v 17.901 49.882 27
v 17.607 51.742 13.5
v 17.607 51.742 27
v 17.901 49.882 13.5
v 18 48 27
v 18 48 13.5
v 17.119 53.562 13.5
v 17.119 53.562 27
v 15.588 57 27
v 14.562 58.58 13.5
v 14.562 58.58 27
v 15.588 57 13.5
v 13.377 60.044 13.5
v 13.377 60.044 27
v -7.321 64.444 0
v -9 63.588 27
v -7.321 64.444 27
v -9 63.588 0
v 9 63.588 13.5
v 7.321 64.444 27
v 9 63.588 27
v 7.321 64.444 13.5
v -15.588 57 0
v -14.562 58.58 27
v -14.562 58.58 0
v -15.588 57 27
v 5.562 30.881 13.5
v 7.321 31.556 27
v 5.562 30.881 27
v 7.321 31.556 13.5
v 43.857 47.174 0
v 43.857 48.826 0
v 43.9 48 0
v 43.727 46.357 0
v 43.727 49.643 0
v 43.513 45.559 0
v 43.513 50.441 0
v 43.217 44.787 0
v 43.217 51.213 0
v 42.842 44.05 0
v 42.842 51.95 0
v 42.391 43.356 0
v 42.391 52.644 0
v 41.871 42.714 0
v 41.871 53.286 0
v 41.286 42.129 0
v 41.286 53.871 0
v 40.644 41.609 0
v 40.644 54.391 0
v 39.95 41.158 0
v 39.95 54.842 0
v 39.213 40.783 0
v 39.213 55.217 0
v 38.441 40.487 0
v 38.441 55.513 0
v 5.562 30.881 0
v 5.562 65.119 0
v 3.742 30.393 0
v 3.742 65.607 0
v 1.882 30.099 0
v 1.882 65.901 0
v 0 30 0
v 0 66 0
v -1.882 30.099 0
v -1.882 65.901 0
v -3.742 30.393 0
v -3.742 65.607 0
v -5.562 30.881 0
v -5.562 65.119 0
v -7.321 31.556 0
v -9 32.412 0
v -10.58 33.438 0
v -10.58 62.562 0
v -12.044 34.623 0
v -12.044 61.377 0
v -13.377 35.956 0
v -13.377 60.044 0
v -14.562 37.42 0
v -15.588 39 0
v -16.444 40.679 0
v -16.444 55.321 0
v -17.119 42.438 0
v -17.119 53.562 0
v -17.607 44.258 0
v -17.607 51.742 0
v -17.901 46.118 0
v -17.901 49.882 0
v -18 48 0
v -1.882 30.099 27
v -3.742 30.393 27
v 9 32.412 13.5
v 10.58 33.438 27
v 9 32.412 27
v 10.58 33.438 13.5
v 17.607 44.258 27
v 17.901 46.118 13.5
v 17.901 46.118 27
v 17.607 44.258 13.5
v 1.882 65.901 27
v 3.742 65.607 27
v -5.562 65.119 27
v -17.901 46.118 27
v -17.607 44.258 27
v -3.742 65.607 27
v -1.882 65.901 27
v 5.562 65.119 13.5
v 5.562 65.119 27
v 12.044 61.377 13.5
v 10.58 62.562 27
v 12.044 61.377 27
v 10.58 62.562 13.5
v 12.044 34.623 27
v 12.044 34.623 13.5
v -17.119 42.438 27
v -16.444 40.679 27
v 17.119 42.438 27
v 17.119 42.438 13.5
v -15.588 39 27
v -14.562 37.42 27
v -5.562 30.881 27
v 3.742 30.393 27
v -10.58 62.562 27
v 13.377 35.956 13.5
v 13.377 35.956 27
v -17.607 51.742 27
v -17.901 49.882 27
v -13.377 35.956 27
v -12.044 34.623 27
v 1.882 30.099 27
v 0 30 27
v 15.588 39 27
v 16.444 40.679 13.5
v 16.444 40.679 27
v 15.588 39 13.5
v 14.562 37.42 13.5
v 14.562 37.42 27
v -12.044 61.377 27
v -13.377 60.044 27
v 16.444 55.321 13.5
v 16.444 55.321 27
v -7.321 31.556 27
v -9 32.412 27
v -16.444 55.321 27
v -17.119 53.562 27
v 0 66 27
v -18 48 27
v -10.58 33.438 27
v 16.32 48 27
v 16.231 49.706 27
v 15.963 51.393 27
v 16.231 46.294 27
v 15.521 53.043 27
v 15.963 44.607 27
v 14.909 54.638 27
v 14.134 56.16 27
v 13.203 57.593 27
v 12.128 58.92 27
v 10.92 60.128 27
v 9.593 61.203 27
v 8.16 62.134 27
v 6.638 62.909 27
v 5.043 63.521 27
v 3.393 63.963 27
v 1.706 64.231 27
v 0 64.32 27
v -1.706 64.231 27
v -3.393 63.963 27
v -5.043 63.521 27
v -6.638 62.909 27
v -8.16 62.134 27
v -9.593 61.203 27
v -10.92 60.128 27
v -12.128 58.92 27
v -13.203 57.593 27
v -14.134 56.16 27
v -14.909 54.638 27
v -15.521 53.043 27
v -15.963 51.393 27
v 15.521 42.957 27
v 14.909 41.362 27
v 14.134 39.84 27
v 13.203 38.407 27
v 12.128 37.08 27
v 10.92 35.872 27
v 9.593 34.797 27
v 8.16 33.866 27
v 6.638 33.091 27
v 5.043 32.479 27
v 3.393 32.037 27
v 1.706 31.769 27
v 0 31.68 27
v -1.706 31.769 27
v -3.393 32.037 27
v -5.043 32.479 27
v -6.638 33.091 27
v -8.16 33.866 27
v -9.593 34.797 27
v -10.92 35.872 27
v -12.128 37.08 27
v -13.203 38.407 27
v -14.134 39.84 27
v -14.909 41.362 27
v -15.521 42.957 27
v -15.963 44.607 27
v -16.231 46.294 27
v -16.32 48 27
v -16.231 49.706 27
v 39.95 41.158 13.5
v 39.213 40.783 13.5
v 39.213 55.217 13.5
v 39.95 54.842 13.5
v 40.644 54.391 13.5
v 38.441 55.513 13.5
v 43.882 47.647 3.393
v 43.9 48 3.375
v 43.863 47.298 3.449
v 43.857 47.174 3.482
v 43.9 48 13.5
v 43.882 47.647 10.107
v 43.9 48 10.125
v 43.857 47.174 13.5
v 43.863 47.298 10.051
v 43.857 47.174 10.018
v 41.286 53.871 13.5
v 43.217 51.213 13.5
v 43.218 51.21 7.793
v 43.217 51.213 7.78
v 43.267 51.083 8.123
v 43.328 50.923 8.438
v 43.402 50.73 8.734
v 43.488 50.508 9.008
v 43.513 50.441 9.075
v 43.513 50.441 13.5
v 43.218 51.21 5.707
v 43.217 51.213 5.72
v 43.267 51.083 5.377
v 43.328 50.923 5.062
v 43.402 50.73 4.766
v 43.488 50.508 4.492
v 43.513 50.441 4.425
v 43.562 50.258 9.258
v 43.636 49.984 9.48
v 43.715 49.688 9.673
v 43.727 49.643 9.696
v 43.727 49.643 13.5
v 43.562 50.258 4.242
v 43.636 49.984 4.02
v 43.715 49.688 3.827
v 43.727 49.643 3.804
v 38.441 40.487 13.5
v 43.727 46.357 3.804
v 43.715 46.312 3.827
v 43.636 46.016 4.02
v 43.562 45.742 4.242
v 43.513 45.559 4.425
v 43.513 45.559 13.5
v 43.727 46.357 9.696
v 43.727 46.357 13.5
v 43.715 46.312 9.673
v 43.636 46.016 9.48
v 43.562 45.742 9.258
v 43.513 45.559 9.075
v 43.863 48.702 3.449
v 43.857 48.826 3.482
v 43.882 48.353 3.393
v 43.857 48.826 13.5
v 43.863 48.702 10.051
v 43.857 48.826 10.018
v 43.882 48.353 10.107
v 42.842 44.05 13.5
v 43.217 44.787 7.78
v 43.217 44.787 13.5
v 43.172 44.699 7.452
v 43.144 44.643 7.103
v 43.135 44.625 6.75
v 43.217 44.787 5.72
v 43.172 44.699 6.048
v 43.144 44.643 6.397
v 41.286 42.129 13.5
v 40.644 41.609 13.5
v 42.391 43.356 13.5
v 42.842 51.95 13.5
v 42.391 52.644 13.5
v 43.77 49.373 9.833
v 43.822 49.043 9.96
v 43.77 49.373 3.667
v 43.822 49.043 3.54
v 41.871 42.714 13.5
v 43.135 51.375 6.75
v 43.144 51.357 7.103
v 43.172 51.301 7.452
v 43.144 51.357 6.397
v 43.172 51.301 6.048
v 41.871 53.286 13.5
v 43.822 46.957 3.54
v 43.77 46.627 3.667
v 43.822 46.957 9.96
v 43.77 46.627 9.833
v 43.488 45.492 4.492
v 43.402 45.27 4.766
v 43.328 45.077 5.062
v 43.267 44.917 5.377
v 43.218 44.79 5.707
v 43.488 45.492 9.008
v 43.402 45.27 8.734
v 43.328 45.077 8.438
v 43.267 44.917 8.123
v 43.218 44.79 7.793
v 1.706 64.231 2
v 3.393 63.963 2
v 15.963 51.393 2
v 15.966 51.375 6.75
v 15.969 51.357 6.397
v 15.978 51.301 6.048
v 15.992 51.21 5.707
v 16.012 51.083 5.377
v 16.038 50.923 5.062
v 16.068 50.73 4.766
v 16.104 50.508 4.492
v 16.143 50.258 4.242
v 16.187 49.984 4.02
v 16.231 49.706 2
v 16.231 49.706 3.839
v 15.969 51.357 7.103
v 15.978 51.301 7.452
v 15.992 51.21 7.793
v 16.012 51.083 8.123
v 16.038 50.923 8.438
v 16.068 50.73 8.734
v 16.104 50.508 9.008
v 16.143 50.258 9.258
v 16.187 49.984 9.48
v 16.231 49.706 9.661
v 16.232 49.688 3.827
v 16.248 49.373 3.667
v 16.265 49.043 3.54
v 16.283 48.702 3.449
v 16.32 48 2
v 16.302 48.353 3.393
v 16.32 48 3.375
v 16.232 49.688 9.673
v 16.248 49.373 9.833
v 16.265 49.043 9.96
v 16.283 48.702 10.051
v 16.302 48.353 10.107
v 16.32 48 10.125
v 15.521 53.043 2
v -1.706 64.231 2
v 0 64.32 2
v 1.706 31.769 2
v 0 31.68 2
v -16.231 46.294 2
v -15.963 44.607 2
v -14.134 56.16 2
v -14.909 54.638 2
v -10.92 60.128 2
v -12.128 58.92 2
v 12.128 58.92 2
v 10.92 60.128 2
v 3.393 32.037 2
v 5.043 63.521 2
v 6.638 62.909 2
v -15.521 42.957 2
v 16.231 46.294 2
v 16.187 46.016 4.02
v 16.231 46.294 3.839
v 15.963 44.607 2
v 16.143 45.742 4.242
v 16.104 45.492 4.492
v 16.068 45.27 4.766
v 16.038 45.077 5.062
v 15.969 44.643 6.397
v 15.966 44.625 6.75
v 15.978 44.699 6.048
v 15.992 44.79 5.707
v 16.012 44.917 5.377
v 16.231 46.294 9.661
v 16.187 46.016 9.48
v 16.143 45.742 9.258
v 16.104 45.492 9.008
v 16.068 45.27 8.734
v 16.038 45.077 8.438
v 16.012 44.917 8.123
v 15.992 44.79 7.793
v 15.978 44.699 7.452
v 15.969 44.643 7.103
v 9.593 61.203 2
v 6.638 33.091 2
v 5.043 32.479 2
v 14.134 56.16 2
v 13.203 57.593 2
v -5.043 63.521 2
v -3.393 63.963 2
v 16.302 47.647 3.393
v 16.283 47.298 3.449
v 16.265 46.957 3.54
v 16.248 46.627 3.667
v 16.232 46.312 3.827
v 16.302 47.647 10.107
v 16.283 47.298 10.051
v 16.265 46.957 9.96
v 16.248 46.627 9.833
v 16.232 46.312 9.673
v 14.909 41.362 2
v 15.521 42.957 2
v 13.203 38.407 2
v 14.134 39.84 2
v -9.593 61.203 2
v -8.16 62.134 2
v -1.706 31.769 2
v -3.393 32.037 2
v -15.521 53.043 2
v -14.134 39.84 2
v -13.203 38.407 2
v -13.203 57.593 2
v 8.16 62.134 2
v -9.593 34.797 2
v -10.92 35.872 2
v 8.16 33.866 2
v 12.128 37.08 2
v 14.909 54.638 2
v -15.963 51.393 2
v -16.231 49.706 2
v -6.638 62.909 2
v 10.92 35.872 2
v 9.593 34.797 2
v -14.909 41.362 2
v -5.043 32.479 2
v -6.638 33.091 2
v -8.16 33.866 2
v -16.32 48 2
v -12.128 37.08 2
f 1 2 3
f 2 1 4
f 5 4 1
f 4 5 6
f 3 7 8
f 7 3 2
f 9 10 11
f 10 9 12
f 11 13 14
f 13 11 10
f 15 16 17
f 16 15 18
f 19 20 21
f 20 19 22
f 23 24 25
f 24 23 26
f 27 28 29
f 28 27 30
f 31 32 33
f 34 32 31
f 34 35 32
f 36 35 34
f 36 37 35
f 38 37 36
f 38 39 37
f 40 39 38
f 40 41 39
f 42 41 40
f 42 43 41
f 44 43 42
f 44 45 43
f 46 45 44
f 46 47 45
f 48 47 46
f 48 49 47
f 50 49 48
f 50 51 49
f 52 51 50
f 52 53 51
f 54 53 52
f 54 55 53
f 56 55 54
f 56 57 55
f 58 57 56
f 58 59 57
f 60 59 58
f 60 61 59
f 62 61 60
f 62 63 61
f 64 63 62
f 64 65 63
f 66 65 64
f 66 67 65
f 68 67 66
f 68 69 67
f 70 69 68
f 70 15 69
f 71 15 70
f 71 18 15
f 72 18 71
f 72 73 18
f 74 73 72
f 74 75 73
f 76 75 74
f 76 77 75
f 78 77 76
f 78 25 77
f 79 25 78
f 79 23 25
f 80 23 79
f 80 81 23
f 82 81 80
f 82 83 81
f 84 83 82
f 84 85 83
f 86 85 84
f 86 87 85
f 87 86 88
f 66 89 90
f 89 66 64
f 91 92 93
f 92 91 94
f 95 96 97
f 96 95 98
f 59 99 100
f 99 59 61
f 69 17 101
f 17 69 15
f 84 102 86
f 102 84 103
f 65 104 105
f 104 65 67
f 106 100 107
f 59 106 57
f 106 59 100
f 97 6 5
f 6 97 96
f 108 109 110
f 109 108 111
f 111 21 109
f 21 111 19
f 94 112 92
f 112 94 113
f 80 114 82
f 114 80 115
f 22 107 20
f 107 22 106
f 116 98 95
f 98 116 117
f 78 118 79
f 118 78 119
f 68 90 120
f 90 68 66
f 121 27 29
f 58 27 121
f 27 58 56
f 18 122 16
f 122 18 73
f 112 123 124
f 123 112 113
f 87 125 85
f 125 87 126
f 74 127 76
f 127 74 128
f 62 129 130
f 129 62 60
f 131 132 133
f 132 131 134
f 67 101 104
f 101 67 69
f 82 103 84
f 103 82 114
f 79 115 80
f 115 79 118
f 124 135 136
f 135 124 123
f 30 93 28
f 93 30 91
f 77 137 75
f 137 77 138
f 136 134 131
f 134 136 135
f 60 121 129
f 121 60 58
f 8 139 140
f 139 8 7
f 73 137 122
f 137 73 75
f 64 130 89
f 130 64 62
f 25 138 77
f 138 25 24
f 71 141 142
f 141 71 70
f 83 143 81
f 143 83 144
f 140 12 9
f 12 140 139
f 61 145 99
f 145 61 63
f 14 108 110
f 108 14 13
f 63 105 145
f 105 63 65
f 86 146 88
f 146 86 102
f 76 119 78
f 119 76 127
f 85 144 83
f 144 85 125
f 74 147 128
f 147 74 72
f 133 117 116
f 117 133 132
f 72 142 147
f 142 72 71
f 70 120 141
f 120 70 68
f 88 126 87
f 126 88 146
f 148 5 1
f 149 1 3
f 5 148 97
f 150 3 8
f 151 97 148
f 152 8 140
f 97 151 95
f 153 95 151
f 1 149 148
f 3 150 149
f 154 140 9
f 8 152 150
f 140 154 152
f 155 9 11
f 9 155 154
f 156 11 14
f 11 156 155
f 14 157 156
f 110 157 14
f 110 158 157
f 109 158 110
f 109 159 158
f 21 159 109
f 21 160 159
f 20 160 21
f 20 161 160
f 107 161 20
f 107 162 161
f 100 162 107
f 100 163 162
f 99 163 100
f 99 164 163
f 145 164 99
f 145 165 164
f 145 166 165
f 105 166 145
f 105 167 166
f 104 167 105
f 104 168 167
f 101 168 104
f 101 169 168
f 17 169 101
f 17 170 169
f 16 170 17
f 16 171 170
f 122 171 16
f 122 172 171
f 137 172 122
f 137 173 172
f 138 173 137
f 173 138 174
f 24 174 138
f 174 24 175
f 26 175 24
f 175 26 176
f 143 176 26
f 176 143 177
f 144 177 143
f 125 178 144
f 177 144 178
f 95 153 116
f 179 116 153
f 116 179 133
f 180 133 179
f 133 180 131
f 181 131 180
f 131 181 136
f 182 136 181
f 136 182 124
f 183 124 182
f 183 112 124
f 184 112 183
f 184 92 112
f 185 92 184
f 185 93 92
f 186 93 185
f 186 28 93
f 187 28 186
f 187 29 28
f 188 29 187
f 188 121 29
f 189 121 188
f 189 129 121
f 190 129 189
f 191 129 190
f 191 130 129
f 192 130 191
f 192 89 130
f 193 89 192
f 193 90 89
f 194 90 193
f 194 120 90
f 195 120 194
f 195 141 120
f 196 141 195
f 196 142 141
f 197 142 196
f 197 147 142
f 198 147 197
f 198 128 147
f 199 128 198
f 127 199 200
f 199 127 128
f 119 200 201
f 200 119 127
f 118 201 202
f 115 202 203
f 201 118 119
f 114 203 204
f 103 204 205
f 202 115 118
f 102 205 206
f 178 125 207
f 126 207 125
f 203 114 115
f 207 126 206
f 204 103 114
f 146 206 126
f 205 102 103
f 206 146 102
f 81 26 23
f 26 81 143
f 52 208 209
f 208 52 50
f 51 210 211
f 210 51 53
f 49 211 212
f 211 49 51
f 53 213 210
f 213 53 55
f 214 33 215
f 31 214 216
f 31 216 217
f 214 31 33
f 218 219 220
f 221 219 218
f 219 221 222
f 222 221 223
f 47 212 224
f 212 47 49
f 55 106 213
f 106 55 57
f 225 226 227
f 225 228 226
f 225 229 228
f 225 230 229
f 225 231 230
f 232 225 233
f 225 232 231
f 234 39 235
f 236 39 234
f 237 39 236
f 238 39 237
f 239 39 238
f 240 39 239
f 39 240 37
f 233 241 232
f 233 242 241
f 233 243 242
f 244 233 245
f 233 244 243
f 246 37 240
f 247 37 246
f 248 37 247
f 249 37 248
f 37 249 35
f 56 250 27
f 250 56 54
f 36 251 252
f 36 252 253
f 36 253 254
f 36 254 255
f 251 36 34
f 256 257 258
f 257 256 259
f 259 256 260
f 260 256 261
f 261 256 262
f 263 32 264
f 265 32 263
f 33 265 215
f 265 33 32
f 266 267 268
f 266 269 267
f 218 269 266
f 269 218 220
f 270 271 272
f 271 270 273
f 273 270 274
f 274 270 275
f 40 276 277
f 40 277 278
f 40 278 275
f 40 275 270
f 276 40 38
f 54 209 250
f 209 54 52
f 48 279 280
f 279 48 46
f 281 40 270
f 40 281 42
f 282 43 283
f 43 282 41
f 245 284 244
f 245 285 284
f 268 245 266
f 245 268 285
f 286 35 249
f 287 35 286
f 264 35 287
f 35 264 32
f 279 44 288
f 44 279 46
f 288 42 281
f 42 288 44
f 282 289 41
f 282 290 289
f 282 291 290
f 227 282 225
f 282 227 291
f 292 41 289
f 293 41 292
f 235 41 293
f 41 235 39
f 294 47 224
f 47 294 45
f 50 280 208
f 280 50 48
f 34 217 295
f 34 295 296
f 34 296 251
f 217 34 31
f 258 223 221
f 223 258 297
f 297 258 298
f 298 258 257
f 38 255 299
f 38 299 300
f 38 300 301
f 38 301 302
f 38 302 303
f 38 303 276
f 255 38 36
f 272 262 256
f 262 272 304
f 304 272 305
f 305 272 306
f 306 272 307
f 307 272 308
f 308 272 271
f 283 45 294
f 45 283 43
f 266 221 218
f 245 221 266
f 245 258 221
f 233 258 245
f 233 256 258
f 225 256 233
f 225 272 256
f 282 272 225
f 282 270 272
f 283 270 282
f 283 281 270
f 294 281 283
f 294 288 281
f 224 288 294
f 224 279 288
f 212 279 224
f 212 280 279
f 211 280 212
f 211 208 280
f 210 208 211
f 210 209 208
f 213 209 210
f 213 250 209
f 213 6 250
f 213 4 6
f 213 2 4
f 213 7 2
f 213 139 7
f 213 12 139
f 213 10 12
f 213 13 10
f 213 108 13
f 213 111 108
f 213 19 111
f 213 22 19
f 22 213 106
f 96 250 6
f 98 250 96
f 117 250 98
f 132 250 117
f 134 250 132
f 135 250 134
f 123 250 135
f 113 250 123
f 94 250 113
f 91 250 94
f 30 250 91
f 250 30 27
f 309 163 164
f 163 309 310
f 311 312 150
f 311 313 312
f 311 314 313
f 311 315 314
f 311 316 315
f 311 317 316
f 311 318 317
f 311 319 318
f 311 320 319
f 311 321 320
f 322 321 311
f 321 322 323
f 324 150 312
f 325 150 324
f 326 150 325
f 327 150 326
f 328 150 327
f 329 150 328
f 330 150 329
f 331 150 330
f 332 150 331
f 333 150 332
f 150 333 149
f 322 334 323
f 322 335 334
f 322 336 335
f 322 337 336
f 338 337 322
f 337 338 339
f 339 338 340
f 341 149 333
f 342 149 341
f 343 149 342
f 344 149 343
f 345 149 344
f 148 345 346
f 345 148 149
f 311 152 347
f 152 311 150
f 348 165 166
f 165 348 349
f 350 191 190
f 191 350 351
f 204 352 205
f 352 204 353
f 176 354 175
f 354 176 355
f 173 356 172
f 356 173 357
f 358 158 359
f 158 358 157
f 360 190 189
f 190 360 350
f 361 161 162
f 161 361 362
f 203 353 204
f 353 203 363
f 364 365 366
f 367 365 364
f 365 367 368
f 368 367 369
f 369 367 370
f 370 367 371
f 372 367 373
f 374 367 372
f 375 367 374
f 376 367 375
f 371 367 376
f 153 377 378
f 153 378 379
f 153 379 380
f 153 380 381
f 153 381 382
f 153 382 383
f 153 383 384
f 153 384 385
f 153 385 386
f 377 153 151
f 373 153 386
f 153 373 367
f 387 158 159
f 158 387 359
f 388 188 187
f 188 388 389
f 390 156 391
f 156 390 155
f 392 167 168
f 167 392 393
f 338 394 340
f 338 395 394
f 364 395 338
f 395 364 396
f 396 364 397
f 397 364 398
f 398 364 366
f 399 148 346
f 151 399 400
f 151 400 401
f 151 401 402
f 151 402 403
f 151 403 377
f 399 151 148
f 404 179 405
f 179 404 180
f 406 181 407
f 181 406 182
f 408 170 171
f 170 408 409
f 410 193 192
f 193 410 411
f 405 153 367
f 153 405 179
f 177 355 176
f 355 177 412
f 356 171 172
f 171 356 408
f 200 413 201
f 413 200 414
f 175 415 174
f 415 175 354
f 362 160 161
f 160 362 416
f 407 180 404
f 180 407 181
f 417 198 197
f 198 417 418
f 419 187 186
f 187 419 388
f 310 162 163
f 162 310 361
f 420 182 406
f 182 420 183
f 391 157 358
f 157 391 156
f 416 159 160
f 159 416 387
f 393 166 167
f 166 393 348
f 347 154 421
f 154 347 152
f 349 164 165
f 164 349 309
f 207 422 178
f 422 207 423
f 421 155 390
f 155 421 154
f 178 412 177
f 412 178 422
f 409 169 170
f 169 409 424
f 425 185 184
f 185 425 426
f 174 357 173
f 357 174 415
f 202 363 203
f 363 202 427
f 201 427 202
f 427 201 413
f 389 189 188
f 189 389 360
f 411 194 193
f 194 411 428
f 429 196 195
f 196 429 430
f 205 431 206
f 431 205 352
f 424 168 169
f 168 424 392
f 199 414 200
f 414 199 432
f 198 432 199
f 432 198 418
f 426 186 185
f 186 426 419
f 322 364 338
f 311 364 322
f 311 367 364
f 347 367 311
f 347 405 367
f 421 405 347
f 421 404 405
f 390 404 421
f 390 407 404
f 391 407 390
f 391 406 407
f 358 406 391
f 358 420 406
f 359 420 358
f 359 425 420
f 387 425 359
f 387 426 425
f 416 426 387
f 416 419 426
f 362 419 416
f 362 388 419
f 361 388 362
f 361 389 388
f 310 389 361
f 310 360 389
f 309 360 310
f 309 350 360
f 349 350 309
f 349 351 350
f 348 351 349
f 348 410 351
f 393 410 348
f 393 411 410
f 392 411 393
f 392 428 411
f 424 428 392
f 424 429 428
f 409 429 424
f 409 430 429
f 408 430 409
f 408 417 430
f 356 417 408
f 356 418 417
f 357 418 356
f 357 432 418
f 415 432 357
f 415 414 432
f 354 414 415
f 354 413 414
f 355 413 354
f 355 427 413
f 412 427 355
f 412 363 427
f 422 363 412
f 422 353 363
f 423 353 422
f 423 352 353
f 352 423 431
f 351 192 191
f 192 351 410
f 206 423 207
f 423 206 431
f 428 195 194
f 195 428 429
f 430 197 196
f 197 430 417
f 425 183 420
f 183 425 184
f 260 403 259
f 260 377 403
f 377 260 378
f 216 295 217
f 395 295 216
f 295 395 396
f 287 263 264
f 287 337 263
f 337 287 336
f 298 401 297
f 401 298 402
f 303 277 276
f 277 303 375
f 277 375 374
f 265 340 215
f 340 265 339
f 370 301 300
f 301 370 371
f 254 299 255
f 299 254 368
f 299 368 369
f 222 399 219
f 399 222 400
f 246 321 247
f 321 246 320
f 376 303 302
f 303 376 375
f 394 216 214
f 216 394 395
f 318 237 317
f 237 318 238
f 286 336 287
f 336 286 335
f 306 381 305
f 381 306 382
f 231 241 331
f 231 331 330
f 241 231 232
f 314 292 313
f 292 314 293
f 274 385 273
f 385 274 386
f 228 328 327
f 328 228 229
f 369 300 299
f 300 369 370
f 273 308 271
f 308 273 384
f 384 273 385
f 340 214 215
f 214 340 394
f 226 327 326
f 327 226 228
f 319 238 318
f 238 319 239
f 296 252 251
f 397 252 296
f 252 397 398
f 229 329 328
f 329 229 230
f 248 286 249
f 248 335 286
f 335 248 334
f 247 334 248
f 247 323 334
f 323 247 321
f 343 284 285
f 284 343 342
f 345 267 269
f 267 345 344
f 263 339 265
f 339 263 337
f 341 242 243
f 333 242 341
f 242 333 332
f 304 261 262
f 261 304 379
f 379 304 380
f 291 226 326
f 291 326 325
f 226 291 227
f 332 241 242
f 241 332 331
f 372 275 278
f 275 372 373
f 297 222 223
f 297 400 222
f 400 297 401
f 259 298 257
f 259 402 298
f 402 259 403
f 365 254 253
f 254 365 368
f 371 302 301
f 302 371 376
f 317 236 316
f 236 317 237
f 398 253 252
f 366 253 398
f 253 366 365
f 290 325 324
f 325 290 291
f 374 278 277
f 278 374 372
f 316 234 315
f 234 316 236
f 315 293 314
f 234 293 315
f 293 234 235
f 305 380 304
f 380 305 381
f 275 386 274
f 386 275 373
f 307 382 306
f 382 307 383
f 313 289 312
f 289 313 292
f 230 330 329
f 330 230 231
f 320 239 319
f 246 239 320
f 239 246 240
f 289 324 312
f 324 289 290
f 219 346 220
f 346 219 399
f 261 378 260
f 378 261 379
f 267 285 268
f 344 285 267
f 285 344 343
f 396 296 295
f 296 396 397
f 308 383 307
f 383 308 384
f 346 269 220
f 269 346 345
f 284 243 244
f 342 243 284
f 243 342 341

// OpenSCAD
// optical head for electrometer. gas meter, water meter
// With magnet from unimagnet 
// parameters
$fn=60;
stena = 2;
dmagout = 32;
dmagin = 15.8;
hmag = 3;
dout = dmagout+2*stena;
hvicka = 27;

module led_holder_lower() {
    difference() {
         union() {
              cylinder(d=dout,h=stena);
              translate([0,0,stena]) cylinder(d=dmagin,h=2*hmag);
             }
         union() {
              translate([3.25,0,0]) cylinder(d=5.2,h=2*hmag+stena);
              translate([-3.25,0,0]) cylinder(d=5.2,h=2*hmag+stena);
             }    
        }
    
}
module led_holder_upper() {
  difference() {  
      cylinder(d=dmagout,h=hmag);
      cylinder(d=dmagin,h=hmag);
     } 
}

module vicko() {
    difference() {
         union() {
          cylinder(d=dout,h=hvicka);
          hull() {
           cylinder(d=dout,h=hvicka/2);
           translate([dout,0,0]) cylinder(d=dmagin,h=hvicka/2);   
          }   
         }
         union() {
           translate([0,0,stena]) cylinder(d=1.02*dmagout,h=hvicka);
           translate([dout/4,0,hvicka/4]) rotate([0,90,0]) cylinder(d=hvicka/4,h=dout);  
         }
        }
}


// led_holder_lower();
// translate([1.5*dmagout,0,0]) led_holder_upper();
translate([0,1.5*dmagout,0]) vicko();
